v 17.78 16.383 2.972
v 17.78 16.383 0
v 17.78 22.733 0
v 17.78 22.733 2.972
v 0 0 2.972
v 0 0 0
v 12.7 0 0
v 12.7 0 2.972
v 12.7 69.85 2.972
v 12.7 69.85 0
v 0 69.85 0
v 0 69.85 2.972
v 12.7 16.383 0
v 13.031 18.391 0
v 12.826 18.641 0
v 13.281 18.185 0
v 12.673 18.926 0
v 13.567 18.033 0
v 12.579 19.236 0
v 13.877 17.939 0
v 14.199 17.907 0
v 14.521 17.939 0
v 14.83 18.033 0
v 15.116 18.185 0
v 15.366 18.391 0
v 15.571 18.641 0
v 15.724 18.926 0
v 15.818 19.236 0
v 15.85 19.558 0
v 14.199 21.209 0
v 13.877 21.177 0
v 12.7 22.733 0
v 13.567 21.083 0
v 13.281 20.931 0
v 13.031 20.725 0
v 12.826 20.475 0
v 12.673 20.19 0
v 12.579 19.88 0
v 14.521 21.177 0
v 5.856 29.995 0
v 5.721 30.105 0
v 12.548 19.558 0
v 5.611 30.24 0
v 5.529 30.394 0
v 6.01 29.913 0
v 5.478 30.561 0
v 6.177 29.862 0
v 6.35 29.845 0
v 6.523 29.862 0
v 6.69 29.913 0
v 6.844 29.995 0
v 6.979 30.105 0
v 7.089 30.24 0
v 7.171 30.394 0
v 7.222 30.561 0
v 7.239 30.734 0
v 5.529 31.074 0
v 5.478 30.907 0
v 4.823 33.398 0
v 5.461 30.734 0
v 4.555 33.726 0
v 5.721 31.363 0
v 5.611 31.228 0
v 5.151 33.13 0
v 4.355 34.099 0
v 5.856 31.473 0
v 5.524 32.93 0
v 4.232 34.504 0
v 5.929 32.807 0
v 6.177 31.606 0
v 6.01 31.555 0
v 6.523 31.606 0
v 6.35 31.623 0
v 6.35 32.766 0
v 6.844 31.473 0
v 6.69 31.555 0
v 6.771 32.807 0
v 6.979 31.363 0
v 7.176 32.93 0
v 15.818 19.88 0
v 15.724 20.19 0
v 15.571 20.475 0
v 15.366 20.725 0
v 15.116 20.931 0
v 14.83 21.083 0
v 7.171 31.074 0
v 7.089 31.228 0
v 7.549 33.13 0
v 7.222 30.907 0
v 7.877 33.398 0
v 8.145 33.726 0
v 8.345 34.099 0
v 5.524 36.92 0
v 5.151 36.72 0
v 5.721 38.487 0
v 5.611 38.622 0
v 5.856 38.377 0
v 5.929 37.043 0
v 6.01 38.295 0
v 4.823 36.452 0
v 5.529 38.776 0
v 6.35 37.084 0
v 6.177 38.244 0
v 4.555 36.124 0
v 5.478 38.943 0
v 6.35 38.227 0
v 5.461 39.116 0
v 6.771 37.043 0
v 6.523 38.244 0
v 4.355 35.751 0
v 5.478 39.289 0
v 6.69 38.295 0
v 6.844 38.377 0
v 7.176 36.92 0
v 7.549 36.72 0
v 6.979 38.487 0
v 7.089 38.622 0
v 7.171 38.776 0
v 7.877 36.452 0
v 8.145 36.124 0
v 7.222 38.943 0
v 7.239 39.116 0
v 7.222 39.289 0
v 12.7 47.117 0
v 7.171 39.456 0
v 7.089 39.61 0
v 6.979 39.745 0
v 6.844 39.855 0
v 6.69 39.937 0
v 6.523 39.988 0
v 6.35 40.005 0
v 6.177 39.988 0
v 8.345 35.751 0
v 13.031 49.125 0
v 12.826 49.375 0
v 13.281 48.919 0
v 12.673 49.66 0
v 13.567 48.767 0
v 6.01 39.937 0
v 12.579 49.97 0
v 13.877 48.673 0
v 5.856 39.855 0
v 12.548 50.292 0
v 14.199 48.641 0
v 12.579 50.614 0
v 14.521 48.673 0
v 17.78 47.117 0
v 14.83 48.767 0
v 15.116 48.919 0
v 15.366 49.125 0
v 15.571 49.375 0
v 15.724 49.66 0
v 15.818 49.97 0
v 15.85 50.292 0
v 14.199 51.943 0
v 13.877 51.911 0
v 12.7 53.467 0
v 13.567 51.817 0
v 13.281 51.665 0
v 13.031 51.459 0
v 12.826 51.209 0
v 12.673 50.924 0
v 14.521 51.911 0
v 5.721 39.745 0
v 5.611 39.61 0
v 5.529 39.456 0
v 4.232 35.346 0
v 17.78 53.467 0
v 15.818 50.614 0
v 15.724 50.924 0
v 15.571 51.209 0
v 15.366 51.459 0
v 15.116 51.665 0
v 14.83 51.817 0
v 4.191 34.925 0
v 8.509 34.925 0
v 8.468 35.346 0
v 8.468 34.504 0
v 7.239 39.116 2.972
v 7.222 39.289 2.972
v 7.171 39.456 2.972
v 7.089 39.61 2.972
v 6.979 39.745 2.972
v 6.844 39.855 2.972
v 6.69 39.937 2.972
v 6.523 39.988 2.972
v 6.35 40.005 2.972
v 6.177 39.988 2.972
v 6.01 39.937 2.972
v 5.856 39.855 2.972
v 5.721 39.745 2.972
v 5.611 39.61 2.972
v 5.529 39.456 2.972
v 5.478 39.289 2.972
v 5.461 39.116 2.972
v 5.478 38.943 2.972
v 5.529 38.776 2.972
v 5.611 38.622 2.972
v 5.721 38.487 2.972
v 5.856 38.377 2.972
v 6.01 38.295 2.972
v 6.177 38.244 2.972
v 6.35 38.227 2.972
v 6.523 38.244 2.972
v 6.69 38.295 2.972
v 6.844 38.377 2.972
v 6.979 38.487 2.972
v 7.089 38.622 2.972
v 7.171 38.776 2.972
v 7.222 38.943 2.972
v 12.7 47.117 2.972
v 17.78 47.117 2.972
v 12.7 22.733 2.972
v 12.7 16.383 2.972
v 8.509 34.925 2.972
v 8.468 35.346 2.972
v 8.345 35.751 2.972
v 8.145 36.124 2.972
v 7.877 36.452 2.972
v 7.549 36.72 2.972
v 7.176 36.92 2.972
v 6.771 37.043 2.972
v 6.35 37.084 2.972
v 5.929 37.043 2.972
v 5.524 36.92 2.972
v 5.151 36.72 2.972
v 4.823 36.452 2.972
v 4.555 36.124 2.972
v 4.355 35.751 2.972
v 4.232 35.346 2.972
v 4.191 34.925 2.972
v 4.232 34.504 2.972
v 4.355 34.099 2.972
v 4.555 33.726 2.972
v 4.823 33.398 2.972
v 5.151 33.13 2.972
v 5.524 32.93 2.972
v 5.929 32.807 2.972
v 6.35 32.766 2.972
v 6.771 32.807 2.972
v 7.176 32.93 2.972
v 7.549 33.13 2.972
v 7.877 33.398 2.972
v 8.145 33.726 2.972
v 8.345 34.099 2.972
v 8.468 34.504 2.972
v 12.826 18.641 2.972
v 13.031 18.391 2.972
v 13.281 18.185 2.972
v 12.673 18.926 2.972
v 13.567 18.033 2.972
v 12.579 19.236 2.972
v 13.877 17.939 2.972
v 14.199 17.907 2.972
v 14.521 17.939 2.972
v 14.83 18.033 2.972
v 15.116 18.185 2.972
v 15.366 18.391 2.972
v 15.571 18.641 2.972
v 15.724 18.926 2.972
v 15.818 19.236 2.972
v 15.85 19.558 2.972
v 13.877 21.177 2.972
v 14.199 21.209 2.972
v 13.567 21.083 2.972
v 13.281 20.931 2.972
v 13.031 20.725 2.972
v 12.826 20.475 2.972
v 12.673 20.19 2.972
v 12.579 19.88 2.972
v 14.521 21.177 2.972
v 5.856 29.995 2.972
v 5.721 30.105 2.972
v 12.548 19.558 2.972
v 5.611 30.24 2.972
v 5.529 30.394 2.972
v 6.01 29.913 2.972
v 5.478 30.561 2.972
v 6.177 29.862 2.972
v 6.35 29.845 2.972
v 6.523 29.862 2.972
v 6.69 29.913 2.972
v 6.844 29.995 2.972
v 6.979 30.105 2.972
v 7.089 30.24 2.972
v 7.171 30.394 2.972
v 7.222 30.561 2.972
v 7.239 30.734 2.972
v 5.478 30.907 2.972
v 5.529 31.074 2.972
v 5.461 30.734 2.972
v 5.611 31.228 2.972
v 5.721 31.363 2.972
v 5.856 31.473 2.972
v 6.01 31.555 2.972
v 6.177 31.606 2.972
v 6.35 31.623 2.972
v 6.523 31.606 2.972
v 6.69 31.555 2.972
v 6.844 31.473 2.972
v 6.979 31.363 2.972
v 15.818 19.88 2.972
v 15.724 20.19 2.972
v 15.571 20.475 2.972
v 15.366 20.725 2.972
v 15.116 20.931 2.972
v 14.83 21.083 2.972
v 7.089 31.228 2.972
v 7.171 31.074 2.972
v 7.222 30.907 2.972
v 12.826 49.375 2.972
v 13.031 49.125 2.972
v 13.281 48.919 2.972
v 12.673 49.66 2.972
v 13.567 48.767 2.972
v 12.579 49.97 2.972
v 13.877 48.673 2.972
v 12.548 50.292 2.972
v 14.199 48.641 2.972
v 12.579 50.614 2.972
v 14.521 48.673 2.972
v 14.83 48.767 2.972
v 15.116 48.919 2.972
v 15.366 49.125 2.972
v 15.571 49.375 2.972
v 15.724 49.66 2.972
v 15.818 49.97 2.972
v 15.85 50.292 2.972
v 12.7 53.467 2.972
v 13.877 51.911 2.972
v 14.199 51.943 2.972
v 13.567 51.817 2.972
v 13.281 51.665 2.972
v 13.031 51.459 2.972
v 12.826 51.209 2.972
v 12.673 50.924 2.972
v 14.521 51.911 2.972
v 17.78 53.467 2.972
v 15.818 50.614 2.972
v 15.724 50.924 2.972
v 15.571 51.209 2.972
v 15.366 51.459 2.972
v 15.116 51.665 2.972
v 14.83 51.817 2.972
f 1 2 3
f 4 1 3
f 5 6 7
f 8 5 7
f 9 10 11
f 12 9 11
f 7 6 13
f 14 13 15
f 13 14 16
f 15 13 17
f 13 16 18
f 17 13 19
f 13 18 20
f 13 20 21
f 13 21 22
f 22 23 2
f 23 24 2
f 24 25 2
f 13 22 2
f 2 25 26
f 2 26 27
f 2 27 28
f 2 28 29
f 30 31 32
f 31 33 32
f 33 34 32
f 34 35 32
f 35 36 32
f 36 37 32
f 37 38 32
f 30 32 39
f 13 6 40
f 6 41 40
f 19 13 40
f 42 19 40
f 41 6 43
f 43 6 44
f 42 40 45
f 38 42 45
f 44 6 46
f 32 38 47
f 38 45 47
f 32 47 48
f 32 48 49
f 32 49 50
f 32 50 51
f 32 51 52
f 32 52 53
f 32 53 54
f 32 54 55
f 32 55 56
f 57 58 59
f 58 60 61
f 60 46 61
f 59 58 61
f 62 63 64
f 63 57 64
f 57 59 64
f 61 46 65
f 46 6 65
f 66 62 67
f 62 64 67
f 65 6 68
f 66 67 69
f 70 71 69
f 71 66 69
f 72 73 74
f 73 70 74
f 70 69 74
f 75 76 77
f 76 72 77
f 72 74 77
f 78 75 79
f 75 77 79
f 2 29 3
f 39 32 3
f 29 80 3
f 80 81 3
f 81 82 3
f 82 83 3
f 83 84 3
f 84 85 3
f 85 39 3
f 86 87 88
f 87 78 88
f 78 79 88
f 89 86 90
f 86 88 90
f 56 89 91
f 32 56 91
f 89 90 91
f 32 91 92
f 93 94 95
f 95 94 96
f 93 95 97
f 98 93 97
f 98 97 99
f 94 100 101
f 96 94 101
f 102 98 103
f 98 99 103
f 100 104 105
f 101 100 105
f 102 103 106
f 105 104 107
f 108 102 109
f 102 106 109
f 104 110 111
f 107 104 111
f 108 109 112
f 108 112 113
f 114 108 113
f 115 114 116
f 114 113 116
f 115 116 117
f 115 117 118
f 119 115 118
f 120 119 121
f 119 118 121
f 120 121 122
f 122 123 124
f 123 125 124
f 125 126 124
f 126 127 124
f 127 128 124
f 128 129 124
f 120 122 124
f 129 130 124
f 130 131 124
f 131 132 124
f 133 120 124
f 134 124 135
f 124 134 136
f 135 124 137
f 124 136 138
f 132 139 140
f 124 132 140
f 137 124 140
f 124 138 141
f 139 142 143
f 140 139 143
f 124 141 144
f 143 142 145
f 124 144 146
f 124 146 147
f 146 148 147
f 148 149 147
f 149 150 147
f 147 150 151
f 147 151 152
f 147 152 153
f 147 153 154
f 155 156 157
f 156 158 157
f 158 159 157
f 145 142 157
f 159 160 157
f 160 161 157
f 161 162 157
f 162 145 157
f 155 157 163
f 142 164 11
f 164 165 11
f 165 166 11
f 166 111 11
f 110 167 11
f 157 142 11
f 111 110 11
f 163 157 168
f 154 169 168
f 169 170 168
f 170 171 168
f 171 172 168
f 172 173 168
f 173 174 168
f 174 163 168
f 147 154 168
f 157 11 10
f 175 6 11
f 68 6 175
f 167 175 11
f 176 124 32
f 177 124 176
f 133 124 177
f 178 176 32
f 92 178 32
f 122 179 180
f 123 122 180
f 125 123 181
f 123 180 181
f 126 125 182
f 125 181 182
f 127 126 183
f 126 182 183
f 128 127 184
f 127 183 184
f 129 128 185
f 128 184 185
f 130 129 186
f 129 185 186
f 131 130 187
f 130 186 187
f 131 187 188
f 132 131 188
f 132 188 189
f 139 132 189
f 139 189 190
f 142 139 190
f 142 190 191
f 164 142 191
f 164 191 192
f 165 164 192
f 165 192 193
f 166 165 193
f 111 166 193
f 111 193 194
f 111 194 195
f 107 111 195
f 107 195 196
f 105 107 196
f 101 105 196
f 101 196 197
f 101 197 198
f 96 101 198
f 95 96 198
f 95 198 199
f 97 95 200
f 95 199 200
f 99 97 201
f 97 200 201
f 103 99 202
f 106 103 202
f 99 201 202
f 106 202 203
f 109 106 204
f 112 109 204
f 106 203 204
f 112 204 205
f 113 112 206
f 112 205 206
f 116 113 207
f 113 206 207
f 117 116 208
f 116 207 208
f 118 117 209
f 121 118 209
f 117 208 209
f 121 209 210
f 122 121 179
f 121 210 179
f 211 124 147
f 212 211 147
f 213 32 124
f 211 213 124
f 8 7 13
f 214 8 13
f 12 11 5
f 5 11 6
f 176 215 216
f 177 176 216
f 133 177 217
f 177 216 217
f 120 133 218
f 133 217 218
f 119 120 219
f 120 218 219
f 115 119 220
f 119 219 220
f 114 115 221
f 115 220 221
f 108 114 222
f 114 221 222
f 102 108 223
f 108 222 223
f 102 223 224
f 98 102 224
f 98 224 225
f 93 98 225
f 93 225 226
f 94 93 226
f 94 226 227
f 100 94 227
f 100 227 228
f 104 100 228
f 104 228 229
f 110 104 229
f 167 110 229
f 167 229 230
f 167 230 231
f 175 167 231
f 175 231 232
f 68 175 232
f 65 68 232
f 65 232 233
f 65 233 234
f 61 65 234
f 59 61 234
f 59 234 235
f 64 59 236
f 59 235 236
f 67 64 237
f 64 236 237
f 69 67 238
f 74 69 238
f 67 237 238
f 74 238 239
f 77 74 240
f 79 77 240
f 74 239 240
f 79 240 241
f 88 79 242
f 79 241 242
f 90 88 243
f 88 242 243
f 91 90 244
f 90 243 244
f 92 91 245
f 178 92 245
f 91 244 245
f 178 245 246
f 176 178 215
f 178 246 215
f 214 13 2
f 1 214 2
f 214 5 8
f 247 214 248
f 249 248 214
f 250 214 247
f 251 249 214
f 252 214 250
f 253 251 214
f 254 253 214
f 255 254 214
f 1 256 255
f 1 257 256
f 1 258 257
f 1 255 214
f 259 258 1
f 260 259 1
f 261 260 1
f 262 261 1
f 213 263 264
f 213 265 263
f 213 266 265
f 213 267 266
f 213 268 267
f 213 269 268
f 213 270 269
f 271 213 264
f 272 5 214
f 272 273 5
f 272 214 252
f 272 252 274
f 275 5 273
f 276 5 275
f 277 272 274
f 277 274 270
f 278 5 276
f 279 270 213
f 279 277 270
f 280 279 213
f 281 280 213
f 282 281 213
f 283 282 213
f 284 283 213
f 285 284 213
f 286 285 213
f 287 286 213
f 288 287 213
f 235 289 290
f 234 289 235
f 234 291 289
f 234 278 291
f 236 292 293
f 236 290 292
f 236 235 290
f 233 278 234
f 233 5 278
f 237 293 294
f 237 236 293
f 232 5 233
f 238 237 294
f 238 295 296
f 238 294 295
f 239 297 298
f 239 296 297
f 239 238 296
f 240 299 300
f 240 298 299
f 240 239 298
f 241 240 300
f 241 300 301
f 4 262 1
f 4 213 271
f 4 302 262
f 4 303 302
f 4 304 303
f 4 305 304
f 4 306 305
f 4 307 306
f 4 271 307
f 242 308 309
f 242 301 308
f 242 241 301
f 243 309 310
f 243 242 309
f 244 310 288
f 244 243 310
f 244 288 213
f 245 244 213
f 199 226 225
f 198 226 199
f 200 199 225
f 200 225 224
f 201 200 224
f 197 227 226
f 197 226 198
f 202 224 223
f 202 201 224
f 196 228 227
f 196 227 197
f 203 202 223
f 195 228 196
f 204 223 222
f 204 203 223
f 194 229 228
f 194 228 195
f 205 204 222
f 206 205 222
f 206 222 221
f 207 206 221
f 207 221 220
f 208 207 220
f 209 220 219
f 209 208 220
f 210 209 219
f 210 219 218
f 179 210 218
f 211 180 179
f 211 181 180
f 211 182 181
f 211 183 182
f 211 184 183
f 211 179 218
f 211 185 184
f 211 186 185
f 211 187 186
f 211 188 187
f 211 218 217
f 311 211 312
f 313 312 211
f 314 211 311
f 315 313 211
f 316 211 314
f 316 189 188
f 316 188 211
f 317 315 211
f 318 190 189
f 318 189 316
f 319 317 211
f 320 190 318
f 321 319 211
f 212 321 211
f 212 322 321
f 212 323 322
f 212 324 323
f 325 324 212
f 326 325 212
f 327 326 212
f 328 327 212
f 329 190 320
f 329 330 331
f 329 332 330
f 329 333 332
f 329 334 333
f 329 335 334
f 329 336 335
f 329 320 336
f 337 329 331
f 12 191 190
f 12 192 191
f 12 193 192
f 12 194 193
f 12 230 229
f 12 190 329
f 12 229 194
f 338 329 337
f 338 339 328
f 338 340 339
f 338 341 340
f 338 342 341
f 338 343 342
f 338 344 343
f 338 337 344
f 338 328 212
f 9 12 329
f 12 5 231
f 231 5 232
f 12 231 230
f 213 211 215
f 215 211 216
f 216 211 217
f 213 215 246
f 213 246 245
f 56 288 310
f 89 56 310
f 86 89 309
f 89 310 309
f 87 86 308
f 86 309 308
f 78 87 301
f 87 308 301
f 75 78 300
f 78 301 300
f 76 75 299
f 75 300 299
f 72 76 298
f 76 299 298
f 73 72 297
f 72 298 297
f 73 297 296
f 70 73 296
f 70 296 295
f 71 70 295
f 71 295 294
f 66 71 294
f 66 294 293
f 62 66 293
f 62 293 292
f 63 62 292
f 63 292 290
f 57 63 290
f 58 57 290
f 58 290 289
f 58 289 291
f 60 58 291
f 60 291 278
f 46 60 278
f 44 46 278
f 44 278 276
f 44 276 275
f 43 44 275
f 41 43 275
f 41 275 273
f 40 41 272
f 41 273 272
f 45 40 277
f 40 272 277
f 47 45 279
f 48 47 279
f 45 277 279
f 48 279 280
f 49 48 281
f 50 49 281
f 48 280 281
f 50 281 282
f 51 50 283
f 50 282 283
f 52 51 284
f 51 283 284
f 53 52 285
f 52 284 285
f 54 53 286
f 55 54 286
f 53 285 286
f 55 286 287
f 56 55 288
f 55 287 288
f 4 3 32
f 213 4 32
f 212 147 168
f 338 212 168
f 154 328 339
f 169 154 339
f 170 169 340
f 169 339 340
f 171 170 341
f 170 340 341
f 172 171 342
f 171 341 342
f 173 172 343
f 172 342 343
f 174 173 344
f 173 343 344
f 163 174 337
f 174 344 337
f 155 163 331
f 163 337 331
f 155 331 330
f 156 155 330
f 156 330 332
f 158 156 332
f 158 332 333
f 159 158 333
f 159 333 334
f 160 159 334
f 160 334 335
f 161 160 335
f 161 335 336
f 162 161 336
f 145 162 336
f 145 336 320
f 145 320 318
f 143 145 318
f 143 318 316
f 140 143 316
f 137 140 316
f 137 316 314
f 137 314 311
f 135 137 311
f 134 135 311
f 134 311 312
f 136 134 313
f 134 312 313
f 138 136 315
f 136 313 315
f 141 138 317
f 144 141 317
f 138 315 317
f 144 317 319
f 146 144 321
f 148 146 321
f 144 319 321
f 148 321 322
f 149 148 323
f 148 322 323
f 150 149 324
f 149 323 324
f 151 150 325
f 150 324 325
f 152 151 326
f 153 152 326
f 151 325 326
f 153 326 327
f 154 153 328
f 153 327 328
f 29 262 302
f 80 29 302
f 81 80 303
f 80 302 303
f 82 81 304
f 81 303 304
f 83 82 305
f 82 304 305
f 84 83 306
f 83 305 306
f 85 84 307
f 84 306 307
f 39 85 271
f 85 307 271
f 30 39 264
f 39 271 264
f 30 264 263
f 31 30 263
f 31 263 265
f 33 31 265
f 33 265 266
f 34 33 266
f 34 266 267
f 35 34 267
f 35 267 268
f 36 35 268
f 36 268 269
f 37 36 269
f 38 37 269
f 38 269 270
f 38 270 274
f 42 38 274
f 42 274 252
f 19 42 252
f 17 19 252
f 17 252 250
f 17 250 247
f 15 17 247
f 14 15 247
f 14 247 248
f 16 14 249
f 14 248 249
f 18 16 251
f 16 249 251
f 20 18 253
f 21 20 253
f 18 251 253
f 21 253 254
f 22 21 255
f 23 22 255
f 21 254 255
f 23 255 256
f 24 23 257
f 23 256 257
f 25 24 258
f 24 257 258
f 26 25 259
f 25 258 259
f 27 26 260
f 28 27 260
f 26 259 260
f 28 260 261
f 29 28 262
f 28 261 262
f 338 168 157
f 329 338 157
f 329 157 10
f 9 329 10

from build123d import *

# Parameters (mm, degrees)
F1_DEPTH = 2.9718
F2_R     = 1.651
F2_R_2   = 2.159
F2_R_3   = 0.889
F3_DEPTH = 25.4


with BuildPart() as f1:
    # F0 (on Top) → F1 (new body)
    with BuildSketch(Plane.XY):
        Polygon((0, 69.85), (0, 0), (12.7, 0), (12.7, 16.383), (17.78, 16.383), (17.78, 22.733), (12.7, 22.733), (12.7, 47.117), (17.78, 47.117), (17.78, 53.467), (12.7, 53.467), (12.7, 69.85), align=None)
    extrude(amount=F1_DEPTH)

    # F2 (on face) → F3 (cut)
    with BuildSketch(Plane.XY.offset(2.9718)):
        with Locations((14.1986, 50.292)):
            Circle(F2_R)
        with Locations((14.1986, 19.558)):
            Circle(F2_R)
        with Locations((6.35, 34.925)):
            Circle(F2_R_2)
        with Locations((6.35, 39.116)):
            Circle(F2_R_3)
        with Locations((6.35, 30.734)):
            Circle(F2_R_3)
    extrude(amount=-F3_DEPTH, mode=Mode.SUBTRACT)


solid = f1.part
